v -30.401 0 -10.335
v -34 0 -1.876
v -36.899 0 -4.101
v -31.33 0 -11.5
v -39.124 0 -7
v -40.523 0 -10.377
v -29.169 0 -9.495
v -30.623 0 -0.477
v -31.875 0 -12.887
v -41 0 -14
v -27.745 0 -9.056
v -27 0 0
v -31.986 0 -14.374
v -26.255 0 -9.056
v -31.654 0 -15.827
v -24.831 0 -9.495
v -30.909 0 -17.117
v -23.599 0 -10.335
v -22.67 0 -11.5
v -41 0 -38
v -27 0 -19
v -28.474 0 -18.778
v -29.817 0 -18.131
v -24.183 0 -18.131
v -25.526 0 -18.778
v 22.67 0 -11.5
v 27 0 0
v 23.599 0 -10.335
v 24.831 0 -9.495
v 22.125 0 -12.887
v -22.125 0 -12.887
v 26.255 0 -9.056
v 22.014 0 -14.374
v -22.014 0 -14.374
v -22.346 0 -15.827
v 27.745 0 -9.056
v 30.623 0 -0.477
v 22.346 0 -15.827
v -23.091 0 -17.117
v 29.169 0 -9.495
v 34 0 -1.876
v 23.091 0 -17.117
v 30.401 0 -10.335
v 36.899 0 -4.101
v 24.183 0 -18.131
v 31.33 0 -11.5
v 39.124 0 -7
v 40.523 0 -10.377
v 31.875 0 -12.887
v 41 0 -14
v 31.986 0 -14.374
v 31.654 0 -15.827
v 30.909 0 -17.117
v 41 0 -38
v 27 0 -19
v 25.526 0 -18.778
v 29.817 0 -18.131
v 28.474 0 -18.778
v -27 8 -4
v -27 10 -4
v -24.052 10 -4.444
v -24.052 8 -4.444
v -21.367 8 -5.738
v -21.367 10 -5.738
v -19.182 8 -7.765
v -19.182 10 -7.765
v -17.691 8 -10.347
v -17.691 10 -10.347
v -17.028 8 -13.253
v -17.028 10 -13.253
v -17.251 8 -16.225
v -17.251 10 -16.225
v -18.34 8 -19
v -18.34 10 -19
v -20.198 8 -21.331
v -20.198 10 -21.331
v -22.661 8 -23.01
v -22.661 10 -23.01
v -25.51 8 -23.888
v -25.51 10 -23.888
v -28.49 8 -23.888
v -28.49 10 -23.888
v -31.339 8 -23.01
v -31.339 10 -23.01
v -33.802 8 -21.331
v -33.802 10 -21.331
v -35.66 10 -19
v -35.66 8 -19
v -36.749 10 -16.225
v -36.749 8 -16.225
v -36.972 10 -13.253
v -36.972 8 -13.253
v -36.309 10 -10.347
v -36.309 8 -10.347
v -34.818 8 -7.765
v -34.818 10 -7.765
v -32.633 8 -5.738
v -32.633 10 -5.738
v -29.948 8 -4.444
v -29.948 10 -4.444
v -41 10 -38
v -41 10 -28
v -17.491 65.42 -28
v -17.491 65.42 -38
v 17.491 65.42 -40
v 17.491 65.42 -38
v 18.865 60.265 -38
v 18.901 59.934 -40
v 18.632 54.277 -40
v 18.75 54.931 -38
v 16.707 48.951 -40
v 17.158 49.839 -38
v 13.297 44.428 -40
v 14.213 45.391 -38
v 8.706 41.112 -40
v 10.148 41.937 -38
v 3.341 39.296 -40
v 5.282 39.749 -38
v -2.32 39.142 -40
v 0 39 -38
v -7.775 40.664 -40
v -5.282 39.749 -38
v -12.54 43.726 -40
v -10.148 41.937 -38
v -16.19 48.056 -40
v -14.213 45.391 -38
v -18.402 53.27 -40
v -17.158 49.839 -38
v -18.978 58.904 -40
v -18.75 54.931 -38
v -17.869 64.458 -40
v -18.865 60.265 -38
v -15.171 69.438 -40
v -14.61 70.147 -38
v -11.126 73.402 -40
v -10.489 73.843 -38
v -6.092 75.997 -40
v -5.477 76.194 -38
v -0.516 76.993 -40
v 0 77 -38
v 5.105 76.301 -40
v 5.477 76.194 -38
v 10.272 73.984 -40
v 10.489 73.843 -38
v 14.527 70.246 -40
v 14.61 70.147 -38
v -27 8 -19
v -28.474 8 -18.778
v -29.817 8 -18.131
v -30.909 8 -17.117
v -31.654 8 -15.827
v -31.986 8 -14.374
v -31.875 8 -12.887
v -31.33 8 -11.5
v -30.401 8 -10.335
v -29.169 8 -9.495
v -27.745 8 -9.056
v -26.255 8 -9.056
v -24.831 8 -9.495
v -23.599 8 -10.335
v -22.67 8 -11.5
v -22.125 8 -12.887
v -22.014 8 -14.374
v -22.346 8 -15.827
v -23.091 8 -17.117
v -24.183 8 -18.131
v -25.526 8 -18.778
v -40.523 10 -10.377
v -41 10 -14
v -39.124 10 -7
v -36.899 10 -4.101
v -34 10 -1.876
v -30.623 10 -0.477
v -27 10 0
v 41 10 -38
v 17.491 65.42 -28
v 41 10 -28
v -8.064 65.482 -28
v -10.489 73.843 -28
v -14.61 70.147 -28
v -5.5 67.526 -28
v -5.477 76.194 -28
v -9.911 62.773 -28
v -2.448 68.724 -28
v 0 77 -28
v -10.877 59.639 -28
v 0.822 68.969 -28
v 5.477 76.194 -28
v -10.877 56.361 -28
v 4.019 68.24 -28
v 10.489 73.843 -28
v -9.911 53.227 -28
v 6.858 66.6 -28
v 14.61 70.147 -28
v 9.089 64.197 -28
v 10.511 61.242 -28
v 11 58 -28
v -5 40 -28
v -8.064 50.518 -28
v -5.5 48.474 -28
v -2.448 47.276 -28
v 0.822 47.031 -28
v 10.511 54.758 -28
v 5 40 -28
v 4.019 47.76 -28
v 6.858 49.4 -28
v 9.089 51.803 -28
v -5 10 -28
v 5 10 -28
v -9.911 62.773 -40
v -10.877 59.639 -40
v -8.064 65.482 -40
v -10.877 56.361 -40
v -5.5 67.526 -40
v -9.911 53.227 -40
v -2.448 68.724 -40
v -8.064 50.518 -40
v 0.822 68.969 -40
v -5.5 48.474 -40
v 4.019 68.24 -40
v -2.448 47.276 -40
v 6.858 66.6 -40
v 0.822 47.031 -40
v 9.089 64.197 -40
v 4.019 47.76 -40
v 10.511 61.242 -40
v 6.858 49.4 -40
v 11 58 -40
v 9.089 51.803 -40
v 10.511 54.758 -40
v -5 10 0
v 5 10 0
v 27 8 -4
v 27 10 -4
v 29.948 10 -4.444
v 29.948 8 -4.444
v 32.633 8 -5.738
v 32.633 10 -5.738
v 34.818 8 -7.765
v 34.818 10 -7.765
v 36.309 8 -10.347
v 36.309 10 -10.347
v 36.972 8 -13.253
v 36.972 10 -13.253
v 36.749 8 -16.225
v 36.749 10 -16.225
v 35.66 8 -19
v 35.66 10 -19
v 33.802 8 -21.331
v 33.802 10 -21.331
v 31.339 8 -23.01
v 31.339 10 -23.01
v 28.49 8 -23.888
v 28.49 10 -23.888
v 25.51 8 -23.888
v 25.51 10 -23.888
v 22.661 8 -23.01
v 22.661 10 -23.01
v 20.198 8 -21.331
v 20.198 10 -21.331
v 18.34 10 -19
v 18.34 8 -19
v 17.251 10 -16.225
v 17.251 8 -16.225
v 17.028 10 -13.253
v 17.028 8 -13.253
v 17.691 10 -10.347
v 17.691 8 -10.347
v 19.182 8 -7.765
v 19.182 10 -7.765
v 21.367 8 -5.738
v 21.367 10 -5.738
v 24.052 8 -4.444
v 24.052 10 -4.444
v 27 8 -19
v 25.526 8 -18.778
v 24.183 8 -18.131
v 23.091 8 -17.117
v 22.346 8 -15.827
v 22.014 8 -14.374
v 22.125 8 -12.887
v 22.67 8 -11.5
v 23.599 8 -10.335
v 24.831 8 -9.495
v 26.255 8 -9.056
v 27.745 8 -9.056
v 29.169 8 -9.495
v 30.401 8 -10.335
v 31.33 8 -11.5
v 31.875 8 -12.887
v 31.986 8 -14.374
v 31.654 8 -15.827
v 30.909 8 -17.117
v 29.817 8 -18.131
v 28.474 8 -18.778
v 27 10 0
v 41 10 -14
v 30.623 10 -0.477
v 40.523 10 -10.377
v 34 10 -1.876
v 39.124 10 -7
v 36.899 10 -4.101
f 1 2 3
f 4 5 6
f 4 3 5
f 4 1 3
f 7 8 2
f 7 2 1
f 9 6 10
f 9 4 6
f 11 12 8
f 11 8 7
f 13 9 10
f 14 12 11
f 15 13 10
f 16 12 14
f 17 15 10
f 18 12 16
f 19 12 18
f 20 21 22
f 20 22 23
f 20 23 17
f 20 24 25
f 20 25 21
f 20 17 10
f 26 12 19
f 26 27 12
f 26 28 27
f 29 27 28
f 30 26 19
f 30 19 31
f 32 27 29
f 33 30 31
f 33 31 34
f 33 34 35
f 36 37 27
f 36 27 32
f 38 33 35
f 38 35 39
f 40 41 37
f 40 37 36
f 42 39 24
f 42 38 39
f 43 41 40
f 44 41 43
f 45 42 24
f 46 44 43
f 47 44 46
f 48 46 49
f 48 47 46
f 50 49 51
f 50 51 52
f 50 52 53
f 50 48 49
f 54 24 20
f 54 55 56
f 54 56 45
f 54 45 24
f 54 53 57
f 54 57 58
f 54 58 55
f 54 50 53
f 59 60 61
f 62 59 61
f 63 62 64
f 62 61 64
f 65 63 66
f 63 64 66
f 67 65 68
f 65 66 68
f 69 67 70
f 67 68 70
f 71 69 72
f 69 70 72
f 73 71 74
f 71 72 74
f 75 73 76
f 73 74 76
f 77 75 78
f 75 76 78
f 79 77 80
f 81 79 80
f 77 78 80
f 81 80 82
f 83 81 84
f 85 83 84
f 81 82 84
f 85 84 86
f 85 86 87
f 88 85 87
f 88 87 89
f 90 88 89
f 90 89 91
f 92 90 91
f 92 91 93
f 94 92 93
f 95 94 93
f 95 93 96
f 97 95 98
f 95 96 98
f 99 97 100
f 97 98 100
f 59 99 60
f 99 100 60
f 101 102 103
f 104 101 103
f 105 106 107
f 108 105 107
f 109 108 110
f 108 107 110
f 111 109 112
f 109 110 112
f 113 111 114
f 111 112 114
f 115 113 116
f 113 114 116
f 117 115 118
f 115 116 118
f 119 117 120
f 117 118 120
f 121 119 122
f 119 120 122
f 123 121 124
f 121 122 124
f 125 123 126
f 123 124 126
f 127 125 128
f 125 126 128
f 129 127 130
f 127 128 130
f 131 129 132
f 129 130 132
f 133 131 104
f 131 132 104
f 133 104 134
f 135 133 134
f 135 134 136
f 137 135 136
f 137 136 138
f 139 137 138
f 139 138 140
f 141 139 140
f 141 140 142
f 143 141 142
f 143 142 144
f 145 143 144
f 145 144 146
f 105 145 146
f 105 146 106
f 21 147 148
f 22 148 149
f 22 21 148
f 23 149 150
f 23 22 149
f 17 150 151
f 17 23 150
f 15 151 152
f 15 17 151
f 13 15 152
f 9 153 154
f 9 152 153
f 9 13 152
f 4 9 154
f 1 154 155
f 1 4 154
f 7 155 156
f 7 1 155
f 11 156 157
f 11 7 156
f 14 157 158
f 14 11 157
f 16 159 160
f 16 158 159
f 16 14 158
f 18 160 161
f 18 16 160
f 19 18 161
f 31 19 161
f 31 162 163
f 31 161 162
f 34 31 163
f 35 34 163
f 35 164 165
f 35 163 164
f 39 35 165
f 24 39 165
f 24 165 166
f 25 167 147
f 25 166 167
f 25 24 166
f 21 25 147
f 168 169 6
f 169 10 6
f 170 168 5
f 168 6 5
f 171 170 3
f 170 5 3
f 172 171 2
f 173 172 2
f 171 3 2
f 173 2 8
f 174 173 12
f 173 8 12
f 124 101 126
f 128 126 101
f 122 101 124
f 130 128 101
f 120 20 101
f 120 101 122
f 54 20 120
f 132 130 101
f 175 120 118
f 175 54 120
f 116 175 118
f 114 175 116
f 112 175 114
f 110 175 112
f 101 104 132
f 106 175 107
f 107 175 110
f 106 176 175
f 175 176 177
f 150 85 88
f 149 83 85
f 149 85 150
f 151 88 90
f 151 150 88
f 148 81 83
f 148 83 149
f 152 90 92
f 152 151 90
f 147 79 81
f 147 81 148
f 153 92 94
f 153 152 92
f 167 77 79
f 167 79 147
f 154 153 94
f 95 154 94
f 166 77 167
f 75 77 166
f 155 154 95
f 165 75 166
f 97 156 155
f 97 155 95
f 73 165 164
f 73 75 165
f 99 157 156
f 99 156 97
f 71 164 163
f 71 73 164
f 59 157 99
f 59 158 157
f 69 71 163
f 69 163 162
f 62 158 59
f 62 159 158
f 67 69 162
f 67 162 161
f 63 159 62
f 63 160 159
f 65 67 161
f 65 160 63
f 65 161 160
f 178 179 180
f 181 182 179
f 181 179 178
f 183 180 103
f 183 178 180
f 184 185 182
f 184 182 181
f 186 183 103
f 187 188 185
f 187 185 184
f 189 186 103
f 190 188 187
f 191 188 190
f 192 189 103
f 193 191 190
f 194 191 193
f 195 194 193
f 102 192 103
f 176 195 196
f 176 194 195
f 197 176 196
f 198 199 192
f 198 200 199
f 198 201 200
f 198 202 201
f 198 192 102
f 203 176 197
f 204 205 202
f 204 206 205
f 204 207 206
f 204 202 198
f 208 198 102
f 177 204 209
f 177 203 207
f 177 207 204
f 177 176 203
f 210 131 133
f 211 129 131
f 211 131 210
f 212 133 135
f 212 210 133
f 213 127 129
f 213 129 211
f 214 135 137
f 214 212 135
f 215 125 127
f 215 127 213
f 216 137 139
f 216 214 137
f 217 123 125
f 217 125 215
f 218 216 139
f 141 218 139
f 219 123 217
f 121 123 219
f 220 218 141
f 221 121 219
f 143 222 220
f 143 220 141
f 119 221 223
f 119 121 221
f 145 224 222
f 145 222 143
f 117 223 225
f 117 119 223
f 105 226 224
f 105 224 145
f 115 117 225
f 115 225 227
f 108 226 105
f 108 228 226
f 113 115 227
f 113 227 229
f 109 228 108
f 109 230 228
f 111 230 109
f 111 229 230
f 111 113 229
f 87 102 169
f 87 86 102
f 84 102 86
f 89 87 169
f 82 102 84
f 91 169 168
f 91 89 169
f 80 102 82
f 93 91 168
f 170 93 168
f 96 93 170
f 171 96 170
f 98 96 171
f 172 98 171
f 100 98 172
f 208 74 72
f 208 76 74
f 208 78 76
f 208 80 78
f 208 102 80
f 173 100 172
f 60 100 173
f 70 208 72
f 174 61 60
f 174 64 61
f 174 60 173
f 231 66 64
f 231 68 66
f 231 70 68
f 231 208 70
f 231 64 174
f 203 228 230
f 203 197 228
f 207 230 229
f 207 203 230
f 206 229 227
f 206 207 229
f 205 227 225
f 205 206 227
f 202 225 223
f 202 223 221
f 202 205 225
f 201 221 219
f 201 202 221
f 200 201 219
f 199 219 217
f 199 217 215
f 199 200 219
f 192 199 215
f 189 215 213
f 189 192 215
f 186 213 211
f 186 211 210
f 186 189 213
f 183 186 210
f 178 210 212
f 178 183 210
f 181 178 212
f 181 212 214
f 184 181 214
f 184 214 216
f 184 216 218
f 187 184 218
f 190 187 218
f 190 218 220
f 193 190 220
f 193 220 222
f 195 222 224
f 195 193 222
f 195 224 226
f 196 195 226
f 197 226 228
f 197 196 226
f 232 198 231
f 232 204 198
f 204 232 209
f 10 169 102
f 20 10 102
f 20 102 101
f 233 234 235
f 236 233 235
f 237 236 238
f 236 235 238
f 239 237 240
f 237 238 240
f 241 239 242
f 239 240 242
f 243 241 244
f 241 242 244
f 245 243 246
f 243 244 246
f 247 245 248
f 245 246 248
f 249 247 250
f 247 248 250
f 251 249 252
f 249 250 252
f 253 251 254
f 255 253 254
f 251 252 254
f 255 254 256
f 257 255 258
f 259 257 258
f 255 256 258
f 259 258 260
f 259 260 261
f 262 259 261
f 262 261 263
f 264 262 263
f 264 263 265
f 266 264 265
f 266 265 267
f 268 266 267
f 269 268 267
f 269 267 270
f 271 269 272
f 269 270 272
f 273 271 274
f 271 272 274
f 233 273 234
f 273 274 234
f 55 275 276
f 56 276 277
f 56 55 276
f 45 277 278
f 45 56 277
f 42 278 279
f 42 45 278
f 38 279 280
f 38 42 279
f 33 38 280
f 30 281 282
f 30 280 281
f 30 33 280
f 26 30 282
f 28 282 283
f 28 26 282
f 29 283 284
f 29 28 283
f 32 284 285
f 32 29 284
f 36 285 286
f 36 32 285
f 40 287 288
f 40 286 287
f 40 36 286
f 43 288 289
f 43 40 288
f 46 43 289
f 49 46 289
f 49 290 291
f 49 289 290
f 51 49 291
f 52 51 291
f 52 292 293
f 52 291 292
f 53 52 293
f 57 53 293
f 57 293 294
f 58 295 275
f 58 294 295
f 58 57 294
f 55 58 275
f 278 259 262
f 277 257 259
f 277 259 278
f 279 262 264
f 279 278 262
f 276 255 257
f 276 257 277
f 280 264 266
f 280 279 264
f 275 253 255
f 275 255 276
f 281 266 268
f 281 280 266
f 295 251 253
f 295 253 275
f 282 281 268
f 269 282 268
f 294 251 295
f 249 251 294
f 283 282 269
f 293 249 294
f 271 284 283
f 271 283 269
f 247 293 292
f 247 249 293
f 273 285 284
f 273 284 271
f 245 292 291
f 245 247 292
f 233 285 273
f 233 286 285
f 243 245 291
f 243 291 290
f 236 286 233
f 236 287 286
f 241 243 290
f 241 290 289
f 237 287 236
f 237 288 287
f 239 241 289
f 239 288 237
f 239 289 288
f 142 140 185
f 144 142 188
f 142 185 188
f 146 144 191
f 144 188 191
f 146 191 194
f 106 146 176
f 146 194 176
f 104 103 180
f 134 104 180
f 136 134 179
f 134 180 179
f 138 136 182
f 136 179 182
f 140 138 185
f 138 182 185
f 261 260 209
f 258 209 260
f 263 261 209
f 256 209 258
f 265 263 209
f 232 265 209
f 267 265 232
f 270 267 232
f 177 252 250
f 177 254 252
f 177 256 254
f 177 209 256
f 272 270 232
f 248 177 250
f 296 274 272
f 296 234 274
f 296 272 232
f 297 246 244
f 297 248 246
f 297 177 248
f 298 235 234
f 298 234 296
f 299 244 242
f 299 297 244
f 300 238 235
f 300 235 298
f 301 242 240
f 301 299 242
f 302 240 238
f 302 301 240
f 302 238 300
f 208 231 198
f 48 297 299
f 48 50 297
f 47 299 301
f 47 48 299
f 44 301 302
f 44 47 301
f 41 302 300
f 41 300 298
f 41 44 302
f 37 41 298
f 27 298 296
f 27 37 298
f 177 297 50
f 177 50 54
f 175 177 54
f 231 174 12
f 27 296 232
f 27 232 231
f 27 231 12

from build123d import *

# Parameters (mm, degrees)
EXTRUDE_1_DEPTH     = 41
SKETCH_2_R          = 11
CUT_EXTRUDE_1_DEPTH = 82
EXTRUDE_2_DEPTH     = 5
FILLET_1_R          = 14
CUT_EXTRUDE_2_REACH = 79
SKETCH_4_R          = 5
SKETCH_5_R          = 10
CUT_EXTRUDE_3_DEPTH = 2
SKETCH_6_R          = 19
SKETCH_6_R_2        = 11
EXTRUDE_3_DEPTH     = 2


with BuildPart() as part:
    # 스케치1 → 보스-돌출1 (new body, symmetric)
    with BuildSketch(Plane(origin=(0, 0, 0), x_dir=(0, 0, -1), z_dir=(1, 0, 0))):
        Polygon((0, 0), (38, 0), (38, 77), (28, 77), (28, 10), (0, 10), align=None)
    extrude(amount=EXTRUDE_1_DEPTH, both=True)

    # 스케치2 → 컷-돌출1 (cut)
    with BuildSketch(Plane.XY.offset(-28)):
        with BuildLine():
            Line((-41, 77), (-41, 10))
            Line((-41, 10), (-17.491366878, 65.419709208))
            ThreePointArc((-17.491366878, 65.419709208), (-10.488696893, 73.842576731), (0, 77))
            Line((0, 77), (-41, 77))
        make_face()
        with BuildLine():
            Line((41, 77), (0, 77))
            ThreePointArc((0, 77), (10.488696893, 73.842576731), (17.491366878, 65.419709208))
            Line((17.491366878, 65.419709208), (41, 10))
            Line((41, 10), (41, 77))
        make_face()
        with Locations((0, 58)):
            Circle(SKETCH_2_R)
    extrude(amount=-CUT_EXTRUDE_1_DEPTH, mode=Mode.SUBTRACT)

    # 스케치3 → 보스-돌출2 (add, symmetric)
    with BuildSketch(Plane(origin=(0, 0, 0), x_dir=(0, 0, -1), z_dir=(1, 0, 0))):
        Polygon((0, 10), (28, 10), (28, 40), align=None)
    extrude(amount=EXTRUDE_2_DEPTH, both=True)

    # 필렛1
    fillet_1_edges = [part.edges().sort_by_distance(p)[0] for p in [
        (41, 5, 0),
        (-41, 5, 0),
    ]]
    fillet(fillet_1_edges, radius=FILLET_1_R)

    # 스케치4 → 컷-돌출2 (cut, up to next)
    with BuildSketch(Plane(origin=(0, 0, 0), x_dir=(1, 0, 0), z_dir=(0, 1, 0)), mode=Mode.PRIVATE) as cut_extrude_2_sk1:
        with Locations(Location((-27, 14, 0), (0, 0, 90))):  # turned: the seam where the file's is
            Circle(SKETCH_4_R)
    cut_extrude_2_tool1 = extrude(cut_extrude_2_sk1.sketch, amount=CUT_EXTRUDE_2_REACH, mode=Mode.PRIVATE) & part.part
    add(cut_extrude_2_tool1.solids().sort_by_distance((-27, 0, -14))[0], mode=Mode.SUBTRACT)
    # 스케치4 → 컷-돌출2 (cut, up to next)
    with BuildSketch(Plane(origin=(0, 0, 0), x_dir=(1, 0, 0), z_dir=(0, 1, 0)), mode=Mode.PRIVATE) as cut_extrude_2_sk2:
        with Locations(Location((27, 14, 0), (0, 0, 90))):  # turned: the seam where the file's is
            Circle(SKETCH_4_R)
    cut_extrude_2_tool2 = extrude(cut_extrude_2_sk2.sketch, amount=CUT_EXTRUDE_2_REACH, mode=Mode.PRIVATE) & part.part
    add(cut_extrude_2_tool2.solids().sort_by_distance((27, 0, -14))[0], mode=Mode.SUBTRACT)

    # 스케치5 → 컷-돌출3 (cut)
    with BuildSketch(Plane(origin=(0, 10, 0), x_dir=(1, 0, 0), z_dir=(0, 1, 0))):
        with Locations(Location((-27, 14, 0), (0, 0, 270))):  # turned: the seam where the file's is
            Circle(SKETCH_5_R)
        with Locations(Location((27, 14, 0), (0, 0, 270))):  # turned: the seam where the file's is
            Circle(SKETCH_5_R)
    extrude(amount=-CUT_EXTRUDE_3_DEPTH, mode=Mode.SUBTRACT)

    # 스케치6 → 보스-돌출3 (add)
    with BuildSketch(Plane(origin=(0, 0, -38), x_dir=(-1, 0, 0), z_dir=(0, 0, -1))):
        with Locations(Location((0, 58, 0), (0, 0, 157.01370027))):  # turned: the seam where the file's is
            Circle(SKETCH_6_R)
        with Locations(Location((0, 58, 0), (0, 0, 180))):  # turned: the seam where the file's is
            Circle(SKETCH_6_R_2, mode=Mode.SUBTRACT)
    extrude(amount=EXTRUDE_3_DEPTH)


solid = part.part
